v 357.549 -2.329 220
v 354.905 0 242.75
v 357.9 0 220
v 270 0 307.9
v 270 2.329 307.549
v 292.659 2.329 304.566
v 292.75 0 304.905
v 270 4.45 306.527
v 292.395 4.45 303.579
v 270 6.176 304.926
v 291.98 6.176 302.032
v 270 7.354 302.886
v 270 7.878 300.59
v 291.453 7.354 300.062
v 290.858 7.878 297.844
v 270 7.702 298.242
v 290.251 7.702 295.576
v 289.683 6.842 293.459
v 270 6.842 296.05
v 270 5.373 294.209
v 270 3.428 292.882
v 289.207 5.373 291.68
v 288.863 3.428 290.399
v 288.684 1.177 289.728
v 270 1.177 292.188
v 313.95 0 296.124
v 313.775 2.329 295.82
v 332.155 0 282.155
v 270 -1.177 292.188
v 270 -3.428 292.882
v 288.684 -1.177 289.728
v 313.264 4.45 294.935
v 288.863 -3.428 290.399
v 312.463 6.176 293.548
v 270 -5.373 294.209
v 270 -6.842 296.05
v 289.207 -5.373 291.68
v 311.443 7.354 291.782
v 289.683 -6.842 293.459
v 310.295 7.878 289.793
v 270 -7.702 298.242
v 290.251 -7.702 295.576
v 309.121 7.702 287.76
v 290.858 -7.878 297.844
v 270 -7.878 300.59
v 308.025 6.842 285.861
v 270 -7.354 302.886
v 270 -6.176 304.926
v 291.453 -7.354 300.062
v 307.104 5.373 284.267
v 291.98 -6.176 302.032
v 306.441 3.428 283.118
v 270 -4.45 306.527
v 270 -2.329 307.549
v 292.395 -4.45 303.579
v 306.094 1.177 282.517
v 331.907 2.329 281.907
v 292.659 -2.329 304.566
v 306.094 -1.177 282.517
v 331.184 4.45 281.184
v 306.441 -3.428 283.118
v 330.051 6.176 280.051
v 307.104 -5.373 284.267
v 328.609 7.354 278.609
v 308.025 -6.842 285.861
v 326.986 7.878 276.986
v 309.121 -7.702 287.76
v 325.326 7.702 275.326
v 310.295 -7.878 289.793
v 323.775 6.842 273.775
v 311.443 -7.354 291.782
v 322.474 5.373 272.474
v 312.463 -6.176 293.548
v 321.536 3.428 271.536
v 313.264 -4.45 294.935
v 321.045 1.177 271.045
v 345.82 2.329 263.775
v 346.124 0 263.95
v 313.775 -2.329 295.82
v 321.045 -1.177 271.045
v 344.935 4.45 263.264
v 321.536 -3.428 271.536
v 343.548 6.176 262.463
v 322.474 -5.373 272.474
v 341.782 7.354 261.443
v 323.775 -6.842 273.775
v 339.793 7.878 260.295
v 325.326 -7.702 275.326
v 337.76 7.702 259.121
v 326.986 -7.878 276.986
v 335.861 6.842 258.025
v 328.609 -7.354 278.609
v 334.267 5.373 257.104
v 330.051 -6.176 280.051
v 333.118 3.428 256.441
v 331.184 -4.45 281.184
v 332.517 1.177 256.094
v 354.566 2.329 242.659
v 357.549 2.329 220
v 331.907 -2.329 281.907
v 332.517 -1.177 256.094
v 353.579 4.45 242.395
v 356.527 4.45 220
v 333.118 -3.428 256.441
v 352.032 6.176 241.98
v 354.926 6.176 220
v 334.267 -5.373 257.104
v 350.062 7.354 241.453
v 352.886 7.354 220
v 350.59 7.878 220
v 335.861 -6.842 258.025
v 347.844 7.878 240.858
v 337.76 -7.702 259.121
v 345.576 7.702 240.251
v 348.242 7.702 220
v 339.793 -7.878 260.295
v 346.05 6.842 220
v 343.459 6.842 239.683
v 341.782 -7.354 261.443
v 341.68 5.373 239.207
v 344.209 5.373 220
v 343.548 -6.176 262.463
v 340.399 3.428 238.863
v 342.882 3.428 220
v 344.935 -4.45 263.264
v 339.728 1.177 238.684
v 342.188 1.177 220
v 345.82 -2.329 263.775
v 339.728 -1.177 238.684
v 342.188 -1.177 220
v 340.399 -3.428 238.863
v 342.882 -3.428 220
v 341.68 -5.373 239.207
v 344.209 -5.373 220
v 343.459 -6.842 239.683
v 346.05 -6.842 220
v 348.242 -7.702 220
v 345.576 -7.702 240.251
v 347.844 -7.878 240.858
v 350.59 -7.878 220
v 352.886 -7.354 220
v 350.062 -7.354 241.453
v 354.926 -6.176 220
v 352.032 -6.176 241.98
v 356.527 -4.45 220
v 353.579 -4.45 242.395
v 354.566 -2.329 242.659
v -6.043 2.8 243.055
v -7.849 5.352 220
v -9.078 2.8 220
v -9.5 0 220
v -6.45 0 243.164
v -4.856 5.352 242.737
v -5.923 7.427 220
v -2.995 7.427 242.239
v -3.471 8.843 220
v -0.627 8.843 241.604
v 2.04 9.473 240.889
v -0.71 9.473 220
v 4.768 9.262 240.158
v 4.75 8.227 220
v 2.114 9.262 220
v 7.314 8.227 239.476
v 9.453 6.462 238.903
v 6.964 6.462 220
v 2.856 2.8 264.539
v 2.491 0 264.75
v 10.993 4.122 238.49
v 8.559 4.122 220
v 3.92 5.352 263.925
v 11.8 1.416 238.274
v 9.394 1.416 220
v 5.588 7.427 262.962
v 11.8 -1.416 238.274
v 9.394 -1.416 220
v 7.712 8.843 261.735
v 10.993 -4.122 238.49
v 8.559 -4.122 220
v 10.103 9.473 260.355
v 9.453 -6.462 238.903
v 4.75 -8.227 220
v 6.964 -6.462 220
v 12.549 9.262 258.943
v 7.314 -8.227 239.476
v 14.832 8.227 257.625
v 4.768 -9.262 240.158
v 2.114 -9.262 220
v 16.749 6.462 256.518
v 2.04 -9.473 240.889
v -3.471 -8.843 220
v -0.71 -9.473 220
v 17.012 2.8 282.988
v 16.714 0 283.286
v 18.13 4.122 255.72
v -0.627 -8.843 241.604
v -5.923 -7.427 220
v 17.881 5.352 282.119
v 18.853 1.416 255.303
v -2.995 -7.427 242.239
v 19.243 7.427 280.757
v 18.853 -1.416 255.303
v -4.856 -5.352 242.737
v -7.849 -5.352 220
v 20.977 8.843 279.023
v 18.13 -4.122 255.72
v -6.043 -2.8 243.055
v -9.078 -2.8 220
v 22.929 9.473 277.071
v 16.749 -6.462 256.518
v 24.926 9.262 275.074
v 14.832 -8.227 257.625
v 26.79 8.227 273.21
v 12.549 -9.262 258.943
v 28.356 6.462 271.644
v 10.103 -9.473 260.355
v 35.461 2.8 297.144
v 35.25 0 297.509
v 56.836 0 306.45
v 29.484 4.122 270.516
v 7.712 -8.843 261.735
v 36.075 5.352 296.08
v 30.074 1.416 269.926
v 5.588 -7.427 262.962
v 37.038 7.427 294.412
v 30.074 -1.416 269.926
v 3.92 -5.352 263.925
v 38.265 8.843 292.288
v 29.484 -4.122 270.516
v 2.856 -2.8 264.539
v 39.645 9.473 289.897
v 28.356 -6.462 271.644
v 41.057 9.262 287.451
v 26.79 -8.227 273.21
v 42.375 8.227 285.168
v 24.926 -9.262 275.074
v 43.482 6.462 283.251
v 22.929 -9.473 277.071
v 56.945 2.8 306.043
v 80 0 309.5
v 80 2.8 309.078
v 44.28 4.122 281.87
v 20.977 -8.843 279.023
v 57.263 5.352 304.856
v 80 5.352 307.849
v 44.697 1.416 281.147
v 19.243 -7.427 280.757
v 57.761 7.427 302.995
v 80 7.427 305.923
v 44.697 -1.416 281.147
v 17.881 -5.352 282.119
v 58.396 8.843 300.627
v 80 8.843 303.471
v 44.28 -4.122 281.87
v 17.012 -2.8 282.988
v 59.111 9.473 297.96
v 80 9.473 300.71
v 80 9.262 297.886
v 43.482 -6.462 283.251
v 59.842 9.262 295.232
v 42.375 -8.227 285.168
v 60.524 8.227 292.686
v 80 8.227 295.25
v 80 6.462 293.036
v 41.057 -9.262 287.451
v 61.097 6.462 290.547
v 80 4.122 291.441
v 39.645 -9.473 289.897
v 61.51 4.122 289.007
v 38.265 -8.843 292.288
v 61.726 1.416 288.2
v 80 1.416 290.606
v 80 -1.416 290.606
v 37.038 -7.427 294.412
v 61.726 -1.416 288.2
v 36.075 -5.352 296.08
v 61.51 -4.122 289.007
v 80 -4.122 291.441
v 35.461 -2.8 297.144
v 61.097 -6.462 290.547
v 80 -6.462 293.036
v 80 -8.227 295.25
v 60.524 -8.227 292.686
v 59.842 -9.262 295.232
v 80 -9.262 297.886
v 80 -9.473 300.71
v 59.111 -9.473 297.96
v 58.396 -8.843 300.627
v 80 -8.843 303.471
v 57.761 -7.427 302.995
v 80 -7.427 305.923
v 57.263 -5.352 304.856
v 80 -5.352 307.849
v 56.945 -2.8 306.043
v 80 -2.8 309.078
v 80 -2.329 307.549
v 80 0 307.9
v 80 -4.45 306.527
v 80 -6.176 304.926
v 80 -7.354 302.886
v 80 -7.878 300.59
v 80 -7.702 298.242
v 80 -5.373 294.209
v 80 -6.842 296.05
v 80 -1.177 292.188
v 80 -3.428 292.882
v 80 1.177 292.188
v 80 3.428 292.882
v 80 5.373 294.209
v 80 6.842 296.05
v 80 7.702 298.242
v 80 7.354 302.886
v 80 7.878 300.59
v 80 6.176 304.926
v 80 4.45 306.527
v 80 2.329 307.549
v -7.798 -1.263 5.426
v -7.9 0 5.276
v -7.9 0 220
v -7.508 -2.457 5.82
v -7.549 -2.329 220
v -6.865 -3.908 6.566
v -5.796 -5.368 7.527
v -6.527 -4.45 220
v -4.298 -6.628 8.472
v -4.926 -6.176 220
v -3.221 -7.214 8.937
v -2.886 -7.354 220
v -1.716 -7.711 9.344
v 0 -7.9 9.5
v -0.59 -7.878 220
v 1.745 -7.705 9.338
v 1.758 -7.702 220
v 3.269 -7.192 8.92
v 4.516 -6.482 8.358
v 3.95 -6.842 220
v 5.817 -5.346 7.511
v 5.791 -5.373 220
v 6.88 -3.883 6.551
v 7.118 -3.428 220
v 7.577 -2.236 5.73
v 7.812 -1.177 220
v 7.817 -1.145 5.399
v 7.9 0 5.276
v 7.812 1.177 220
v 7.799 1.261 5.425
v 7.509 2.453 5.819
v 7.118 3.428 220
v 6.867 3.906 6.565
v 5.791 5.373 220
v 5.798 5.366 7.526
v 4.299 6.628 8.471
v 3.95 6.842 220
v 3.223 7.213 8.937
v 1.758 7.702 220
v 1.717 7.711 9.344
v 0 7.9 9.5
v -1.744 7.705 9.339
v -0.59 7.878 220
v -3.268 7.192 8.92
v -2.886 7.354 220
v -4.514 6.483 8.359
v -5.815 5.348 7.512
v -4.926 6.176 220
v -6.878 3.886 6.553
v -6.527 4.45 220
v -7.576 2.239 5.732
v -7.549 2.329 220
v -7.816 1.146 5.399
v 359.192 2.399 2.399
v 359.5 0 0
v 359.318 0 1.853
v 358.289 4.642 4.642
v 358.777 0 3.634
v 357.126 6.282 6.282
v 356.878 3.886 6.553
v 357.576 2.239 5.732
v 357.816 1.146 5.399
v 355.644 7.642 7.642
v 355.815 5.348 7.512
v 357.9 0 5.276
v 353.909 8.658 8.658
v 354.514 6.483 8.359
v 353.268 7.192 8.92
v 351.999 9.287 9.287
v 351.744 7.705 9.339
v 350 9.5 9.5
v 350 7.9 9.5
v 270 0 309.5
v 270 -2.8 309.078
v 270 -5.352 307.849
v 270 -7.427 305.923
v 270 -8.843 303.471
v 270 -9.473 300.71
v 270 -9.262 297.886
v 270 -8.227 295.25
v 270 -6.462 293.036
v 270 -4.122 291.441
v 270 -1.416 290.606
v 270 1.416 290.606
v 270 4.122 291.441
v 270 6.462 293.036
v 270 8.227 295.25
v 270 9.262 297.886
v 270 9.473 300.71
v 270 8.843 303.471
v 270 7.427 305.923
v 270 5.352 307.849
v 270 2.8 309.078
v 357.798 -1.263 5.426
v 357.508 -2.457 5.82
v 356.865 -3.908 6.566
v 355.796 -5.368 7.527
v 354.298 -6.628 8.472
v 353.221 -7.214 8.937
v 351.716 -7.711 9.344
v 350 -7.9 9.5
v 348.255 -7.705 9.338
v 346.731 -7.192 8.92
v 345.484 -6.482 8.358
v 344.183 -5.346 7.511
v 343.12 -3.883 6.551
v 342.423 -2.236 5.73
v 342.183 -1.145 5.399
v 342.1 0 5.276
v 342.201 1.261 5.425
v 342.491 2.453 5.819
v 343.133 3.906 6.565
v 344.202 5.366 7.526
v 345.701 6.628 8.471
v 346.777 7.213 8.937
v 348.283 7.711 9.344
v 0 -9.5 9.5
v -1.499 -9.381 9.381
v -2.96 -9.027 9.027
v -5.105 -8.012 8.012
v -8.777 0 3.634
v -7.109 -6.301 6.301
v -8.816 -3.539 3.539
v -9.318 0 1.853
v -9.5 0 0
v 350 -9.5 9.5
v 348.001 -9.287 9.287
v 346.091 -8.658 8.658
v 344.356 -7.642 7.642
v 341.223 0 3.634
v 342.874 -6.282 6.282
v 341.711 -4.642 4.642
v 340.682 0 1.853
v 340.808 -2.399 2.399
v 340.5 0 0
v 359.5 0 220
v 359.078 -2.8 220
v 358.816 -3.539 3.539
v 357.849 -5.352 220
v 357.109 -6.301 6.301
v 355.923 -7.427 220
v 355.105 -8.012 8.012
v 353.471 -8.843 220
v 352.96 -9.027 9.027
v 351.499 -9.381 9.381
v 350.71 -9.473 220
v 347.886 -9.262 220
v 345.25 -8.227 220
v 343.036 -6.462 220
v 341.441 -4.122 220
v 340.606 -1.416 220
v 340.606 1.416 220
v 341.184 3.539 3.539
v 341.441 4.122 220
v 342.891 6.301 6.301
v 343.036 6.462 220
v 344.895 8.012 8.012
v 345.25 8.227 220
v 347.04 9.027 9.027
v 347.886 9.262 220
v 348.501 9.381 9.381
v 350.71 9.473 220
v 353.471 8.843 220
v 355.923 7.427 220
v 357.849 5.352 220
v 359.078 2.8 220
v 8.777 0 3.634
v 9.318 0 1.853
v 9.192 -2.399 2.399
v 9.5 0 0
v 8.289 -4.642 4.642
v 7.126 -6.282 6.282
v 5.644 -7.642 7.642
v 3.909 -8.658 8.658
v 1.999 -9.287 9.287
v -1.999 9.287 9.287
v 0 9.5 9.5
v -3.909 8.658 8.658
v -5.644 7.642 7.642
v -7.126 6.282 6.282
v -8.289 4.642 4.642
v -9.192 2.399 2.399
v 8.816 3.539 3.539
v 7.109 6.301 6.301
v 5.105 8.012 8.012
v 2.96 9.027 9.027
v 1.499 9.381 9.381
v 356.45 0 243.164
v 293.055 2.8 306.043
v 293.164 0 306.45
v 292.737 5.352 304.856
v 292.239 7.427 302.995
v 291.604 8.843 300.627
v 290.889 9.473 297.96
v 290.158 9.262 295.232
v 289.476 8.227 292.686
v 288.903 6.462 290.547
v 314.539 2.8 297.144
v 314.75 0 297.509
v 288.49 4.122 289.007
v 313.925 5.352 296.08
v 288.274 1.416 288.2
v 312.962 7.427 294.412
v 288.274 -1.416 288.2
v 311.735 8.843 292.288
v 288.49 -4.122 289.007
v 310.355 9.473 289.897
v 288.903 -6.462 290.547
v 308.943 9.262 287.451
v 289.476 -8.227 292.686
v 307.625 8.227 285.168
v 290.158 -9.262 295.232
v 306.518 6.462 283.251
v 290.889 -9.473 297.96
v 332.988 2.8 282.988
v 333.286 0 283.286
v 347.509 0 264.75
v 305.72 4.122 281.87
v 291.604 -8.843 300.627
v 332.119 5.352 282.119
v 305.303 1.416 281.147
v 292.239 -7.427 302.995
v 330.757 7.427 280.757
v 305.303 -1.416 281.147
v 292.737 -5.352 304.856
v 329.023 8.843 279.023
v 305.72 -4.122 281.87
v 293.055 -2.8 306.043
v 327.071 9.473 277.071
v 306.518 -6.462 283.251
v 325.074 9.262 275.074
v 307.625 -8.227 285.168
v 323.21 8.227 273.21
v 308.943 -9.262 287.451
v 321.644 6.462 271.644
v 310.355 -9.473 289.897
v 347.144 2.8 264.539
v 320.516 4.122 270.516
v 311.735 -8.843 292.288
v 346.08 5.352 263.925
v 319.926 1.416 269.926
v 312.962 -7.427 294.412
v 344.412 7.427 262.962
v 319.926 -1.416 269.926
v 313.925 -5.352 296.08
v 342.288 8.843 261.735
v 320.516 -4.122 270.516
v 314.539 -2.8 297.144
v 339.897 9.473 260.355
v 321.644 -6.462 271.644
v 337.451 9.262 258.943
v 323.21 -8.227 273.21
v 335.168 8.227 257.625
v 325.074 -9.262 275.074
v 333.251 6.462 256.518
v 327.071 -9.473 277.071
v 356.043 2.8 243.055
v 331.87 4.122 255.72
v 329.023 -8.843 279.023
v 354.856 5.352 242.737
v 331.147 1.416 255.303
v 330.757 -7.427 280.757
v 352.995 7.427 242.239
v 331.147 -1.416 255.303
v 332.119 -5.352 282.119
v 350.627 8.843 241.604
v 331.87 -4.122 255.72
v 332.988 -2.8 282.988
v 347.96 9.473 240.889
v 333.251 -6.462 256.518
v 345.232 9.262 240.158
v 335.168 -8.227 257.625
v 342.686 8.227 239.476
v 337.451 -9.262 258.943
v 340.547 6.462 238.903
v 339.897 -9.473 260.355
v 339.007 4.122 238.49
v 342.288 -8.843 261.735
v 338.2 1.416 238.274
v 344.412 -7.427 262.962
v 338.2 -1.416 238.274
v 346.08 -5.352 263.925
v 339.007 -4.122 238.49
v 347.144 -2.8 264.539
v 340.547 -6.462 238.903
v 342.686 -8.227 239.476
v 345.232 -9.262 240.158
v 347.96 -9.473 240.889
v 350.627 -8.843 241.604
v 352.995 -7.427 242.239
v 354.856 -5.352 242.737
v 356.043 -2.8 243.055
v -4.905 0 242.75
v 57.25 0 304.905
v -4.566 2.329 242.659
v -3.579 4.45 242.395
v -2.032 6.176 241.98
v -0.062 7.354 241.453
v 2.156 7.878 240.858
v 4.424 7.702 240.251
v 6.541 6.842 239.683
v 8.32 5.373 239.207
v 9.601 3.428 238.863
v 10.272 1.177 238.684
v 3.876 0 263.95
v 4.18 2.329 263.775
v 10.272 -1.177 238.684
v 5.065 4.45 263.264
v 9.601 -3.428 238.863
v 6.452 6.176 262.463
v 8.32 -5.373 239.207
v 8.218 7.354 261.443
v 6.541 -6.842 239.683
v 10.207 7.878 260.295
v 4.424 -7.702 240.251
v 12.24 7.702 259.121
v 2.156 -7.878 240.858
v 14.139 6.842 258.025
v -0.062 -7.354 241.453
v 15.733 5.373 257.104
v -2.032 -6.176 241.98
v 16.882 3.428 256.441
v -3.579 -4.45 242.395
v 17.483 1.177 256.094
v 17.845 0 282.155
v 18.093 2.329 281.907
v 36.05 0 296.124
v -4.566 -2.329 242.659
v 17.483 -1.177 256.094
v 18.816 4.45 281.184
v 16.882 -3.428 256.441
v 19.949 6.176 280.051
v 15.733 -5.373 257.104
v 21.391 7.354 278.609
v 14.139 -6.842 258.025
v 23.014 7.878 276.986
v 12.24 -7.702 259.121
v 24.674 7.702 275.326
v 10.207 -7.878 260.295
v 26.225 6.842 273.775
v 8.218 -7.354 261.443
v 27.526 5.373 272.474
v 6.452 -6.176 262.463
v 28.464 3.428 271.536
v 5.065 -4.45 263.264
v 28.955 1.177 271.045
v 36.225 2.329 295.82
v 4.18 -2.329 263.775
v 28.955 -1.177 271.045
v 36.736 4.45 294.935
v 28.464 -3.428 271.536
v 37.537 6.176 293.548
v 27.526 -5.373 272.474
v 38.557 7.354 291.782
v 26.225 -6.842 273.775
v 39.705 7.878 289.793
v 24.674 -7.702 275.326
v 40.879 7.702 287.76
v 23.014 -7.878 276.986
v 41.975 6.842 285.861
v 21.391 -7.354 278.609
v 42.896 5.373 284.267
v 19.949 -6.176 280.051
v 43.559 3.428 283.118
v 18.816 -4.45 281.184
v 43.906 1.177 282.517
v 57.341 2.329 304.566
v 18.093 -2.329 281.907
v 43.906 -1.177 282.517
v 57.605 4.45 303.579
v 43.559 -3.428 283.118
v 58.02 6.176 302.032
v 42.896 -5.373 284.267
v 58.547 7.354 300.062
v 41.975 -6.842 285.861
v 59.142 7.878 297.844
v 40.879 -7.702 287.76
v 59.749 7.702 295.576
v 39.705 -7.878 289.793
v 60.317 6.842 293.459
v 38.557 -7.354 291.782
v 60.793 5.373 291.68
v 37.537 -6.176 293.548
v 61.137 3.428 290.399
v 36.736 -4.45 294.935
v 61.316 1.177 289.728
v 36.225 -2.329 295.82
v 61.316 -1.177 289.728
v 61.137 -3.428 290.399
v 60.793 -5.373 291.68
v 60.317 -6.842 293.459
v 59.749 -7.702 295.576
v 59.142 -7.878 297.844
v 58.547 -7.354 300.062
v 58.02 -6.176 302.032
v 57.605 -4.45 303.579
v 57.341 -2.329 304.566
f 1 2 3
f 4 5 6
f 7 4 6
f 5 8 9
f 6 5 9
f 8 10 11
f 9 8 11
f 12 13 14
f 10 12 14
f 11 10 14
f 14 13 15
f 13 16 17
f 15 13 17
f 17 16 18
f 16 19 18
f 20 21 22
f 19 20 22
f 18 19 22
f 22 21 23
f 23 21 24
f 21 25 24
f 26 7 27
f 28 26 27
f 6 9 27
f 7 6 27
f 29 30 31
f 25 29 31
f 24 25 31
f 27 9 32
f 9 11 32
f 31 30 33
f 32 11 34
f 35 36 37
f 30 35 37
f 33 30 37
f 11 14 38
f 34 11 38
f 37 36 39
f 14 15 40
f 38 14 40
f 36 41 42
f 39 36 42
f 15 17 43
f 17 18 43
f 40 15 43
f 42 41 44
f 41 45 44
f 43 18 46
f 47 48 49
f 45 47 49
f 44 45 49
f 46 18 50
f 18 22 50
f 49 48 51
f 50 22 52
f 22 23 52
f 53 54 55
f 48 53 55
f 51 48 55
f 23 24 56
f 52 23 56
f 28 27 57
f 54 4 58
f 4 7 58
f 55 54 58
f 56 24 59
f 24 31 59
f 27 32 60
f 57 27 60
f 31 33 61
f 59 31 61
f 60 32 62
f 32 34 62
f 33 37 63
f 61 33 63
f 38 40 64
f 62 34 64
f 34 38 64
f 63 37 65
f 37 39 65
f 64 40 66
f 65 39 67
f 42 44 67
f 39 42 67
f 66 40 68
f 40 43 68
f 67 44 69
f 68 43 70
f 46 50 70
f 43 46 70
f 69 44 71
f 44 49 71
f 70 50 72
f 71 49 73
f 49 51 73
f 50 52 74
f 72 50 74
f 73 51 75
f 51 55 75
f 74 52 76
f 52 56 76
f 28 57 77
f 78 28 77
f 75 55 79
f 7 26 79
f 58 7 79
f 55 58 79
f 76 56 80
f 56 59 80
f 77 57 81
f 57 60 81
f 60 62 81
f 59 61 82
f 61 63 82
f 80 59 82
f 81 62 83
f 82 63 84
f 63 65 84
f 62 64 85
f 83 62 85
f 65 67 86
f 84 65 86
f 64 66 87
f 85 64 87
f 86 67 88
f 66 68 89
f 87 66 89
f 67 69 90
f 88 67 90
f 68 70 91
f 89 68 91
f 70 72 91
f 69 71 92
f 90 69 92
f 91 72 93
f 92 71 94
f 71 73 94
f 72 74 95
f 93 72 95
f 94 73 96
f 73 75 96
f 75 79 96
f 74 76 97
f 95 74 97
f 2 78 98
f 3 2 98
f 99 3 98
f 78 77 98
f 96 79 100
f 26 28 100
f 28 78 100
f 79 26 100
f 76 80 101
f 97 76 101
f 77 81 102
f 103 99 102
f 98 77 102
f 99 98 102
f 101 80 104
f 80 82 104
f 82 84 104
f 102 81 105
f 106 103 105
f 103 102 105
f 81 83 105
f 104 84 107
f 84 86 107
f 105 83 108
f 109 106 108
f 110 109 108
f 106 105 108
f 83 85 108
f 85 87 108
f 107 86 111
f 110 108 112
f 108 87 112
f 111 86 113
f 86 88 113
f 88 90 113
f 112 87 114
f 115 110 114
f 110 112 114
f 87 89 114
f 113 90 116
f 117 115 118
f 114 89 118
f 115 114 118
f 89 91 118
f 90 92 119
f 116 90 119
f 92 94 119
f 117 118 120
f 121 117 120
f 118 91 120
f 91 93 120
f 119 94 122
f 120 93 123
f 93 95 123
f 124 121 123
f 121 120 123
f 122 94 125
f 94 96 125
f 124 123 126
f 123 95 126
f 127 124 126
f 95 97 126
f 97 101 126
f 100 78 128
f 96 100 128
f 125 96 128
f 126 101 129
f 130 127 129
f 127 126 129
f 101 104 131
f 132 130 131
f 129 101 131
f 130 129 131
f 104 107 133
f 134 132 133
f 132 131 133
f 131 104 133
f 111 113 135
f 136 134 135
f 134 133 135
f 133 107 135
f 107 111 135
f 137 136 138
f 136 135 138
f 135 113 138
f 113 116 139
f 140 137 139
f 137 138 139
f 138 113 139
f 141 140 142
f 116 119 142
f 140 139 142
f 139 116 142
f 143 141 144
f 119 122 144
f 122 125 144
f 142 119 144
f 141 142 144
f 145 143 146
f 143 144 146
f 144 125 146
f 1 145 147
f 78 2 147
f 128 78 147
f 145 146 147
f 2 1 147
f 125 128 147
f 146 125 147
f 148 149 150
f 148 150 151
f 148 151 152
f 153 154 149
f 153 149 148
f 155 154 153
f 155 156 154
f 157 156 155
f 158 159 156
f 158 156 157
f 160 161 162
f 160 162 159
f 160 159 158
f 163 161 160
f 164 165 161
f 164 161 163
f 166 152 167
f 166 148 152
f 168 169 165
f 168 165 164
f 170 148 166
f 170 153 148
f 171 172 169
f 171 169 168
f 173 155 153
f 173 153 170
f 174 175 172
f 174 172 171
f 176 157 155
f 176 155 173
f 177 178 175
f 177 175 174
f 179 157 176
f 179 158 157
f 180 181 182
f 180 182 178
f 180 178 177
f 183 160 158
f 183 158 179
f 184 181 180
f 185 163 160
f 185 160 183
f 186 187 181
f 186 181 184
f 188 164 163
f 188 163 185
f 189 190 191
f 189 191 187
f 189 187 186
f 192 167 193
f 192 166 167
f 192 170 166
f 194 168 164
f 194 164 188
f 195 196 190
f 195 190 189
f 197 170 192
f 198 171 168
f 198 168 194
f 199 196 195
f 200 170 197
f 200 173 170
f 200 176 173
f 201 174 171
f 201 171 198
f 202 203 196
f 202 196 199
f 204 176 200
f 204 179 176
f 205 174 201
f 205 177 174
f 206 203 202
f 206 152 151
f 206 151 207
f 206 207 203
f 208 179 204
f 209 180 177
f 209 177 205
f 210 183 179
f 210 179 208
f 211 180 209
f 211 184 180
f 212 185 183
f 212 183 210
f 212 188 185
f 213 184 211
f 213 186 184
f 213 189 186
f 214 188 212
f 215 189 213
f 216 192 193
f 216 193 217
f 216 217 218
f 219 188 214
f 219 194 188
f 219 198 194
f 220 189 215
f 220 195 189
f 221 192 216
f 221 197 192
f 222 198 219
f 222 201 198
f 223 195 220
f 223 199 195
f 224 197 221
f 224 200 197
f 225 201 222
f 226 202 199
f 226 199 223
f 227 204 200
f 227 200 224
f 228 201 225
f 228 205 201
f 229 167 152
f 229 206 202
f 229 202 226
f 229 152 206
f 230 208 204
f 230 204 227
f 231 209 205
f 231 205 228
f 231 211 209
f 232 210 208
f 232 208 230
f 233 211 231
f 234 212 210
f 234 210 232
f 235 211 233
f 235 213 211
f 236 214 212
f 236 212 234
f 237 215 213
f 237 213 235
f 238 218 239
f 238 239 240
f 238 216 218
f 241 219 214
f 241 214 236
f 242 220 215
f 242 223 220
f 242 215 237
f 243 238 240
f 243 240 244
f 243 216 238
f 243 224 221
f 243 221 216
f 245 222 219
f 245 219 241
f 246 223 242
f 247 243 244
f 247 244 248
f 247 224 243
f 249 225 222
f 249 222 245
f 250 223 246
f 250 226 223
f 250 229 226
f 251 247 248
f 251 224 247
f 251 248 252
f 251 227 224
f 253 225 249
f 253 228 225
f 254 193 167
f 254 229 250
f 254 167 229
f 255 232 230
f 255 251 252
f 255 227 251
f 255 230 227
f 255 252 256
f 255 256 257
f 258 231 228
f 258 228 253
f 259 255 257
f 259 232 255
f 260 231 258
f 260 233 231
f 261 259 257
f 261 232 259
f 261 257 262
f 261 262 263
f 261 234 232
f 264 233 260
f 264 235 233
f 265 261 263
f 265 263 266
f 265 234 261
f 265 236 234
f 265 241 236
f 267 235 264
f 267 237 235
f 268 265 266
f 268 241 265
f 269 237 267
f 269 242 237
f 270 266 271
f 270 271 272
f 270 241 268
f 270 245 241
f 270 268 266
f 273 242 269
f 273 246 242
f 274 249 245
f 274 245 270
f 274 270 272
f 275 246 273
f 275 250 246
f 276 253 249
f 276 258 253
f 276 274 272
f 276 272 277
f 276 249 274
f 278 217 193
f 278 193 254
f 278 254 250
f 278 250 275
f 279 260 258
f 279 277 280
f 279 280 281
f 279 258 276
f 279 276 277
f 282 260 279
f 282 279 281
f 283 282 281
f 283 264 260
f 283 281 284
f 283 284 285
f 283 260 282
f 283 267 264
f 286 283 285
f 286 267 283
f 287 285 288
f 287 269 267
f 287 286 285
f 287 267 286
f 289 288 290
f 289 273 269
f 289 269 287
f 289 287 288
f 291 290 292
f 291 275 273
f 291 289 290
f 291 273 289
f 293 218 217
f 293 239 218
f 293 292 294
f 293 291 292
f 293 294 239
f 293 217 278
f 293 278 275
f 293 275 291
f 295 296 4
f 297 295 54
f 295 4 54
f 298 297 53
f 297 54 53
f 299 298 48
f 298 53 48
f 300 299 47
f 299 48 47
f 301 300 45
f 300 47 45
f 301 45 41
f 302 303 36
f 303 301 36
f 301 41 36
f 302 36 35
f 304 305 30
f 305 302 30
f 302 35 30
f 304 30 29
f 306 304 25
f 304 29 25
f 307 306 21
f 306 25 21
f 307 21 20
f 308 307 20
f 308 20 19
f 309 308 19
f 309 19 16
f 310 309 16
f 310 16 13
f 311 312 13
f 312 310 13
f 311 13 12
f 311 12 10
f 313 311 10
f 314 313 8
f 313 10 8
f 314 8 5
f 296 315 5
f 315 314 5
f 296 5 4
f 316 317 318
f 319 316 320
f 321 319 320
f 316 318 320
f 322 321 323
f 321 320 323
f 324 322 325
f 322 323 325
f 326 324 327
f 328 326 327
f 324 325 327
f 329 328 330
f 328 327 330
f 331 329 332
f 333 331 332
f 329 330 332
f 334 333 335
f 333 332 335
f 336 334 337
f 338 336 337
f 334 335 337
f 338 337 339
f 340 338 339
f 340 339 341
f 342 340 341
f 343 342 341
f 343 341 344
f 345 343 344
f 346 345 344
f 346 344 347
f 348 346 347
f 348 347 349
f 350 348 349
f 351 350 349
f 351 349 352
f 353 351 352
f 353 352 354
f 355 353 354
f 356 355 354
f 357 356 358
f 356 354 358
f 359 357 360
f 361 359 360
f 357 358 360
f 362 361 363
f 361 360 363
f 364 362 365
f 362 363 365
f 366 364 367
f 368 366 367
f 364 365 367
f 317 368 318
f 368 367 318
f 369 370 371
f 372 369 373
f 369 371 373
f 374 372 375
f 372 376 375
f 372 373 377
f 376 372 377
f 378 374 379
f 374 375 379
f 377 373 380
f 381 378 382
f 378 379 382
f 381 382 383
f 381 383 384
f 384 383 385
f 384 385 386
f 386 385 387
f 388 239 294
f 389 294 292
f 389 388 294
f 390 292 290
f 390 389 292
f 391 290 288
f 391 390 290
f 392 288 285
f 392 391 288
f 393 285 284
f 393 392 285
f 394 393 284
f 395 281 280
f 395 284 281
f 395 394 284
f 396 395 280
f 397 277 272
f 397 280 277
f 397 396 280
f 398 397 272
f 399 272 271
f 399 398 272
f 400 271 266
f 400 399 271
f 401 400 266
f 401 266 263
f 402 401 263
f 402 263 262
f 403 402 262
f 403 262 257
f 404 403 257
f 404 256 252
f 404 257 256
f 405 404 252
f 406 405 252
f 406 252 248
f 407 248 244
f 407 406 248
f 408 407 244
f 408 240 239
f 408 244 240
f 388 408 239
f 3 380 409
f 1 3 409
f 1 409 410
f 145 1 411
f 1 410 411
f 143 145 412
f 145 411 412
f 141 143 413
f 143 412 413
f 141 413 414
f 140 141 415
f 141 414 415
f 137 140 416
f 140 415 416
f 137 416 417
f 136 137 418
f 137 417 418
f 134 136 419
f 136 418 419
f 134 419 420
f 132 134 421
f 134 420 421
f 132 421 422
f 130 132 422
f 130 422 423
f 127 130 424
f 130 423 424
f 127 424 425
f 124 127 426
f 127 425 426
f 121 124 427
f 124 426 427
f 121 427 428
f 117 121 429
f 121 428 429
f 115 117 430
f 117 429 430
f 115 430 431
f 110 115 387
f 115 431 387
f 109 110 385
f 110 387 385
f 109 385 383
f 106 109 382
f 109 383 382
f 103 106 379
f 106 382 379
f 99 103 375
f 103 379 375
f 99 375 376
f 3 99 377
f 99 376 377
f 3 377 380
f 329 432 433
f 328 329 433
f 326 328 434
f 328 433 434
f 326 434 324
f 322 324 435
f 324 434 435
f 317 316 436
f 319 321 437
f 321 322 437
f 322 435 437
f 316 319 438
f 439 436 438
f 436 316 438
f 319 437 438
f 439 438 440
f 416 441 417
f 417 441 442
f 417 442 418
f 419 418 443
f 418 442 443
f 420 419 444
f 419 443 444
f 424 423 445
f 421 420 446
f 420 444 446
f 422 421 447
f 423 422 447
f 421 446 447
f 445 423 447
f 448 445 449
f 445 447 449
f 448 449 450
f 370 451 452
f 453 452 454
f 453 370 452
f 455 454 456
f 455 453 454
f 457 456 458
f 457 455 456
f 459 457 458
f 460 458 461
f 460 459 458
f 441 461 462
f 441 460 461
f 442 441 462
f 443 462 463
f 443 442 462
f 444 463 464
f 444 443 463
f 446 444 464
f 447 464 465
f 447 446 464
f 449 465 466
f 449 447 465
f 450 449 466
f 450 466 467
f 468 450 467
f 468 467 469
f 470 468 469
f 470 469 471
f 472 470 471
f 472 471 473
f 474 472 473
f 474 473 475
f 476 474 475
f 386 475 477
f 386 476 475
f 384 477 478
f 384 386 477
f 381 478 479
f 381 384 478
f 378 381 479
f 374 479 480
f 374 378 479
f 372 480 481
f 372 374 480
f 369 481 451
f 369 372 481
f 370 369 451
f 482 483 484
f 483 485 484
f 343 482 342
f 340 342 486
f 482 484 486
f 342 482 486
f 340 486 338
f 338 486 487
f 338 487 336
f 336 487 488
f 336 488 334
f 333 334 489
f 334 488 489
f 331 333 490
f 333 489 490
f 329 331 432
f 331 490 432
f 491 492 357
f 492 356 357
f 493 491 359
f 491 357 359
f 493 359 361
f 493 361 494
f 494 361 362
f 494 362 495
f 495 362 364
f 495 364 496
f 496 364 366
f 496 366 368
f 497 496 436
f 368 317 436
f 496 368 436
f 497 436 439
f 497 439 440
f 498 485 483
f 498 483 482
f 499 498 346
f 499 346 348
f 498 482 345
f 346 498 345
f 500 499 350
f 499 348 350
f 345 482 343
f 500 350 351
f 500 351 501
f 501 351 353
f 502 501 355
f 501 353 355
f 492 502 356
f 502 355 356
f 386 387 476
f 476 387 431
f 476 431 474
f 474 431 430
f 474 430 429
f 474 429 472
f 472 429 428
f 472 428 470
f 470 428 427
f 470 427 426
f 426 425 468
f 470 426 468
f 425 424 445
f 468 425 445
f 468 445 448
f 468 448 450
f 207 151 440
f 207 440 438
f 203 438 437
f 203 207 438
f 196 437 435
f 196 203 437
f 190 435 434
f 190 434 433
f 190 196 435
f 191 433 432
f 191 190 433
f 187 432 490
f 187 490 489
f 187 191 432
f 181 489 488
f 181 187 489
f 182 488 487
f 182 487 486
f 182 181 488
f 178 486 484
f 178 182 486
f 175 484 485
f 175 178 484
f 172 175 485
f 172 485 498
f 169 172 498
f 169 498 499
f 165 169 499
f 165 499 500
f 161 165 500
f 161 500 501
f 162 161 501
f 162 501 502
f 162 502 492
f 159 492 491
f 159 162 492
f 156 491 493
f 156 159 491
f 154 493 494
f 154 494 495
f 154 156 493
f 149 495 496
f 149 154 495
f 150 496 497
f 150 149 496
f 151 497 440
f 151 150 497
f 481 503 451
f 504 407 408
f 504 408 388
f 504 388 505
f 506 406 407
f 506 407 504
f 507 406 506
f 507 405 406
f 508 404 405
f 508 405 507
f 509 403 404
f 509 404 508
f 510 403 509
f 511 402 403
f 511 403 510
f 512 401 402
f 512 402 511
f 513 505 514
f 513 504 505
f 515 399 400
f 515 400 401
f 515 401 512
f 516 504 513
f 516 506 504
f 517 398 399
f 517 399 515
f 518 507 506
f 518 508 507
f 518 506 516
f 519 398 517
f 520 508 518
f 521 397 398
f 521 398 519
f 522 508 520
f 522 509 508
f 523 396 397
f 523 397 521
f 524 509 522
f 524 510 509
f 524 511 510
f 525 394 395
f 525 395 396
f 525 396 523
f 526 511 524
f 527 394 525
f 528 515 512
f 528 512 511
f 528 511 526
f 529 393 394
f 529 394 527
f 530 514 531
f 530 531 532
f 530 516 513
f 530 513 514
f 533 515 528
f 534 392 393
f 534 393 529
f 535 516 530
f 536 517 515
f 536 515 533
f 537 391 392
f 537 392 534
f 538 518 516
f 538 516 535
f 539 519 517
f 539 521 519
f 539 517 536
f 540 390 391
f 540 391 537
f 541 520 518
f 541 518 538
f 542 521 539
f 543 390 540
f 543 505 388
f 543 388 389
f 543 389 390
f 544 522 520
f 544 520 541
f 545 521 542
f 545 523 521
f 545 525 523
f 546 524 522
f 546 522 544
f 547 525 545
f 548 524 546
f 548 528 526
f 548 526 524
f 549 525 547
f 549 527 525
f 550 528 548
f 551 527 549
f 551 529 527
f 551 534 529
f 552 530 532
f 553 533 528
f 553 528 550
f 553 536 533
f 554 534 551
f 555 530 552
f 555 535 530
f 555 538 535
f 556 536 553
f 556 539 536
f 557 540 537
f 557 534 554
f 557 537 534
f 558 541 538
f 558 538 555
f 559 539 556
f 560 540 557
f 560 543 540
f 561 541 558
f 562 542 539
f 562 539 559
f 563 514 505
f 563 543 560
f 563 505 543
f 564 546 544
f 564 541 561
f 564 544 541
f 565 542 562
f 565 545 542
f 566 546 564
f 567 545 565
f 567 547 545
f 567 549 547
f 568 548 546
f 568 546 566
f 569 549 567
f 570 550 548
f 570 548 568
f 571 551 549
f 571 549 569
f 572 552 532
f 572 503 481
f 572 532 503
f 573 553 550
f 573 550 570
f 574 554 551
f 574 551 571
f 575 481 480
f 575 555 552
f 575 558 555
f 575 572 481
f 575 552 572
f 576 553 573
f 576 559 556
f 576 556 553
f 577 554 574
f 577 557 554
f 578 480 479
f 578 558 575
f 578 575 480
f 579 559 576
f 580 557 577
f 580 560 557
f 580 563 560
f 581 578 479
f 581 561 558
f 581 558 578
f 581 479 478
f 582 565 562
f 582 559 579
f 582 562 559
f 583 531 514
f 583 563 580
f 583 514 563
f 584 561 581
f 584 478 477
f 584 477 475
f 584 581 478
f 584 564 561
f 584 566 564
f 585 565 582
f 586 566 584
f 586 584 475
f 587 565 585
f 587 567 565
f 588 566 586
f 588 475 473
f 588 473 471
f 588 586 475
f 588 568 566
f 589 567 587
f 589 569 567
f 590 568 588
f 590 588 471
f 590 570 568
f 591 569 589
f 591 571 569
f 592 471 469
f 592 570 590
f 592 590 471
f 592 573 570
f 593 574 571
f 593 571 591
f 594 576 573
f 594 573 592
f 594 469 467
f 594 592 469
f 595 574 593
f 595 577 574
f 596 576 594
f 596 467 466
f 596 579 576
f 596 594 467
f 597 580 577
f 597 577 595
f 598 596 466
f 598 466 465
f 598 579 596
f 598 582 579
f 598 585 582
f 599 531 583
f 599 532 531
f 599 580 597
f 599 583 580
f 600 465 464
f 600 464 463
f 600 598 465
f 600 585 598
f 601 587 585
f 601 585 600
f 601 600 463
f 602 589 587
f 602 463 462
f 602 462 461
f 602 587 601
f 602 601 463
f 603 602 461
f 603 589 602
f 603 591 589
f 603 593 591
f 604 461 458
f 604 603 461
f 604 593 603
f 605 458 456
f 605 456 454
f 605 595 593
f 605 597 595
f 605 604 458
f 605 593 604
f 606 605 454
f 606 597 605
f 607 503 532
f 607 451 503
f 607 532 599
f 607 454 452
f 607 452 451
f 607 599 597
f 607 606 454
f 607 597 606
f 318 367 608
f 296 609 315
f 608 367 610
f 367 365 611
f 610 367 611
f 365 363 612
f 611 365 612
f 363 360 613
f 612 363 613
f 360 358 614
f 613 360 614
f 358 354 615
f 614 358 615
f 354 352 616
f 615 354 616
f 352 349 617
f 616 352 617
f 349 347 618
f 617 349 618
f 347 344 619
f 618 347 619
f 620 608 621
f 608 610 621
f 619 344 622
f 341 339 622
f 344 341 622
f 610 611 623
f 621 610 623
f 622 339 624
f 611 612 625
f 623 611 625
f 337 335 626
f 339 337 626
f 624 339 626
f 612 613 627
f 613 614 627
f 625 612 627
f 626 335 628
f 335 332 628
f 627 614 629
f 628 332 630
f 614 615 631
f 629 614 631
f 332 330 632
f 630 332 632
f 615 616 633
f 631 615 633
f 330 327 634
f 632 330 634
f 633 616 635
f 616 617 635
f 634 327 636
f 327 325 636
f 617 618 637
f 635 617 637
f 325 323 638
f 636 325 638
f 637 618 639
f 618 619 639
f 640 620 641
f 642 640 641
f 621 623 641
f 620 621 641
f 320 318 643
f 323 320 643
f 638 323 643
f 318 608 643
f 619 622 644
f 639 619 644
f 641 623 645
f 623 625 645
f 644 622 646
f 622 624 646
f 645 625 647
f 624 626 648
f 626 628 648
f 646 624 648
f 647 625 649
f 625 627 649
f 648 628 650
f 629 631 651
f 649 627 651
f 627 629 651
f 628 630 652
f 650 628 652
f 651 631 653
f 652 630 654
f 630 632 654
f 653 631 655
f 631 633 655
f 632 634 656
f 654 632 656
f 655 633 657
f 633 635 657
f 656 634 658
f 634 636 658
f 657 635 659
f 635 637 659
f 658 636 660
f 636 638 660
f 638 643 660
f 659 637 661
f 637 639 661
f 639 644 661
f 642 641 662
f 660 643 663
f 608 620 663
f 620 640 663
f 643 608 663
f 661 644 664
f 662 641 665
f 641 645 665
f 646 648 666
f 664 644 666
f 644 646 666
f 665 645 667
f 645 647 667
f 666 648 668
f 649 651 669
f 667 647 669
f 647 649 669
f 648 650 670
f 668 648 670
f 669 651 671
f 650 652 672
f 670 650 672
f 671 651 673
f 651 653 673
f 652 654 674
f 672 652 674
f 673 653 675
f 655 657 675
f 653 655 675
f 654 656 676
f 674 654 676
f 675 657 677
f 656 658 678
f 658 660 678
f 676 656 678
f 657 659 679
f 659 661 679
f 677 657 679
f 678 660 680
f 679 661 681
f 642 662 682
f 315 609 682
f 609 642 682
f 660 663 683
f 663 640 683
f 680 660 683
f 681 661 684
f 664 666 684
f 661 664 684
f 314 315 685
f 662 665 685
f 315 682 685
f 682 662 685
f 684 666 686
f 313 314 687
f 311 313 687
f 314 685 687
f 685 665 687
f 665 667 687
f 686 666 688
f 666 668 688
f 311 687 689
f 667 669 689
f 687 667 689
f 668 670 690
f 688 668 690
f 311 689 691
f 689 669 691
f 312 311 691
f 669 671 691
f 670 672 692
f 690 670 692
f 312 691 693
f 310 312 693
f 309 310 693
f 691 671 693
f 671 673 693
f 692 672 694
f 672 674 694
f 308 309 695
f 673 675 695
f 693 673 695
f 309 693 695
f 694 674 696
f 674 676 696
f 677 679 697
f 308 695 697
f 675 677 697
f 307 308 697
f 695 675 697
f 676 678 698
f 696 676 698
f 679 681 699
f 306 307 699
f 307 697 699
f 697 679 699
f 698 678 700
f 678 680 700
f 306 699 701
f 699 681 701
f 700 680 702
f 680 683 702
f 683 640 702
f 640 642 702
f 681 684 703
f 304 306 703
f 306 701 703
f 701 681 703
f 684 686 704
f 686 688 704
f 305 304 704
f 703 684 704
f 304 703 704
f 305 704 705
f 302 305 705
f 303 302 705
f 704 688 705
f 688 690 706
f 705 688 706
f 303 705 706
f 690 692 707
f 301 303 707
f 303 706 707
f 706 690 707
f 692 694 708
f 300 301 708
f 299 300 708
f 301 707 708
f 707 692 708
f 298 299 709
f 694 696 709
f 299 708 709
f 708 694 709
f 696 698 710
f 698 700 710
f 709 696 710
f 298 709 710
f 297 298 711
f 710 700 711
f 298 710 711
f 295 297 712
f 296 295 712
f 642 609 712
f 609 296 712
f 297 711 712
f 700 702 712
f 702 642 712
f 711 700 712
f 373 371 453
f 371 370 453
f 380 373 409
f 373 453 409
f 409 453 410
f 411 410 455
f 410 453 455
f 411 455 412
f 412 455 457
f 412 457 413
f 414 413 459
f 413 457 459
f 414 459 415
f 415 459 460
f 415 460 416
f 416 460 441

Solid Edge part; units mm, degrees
sketch "Sketch1" plane through (0, 0, 0) normal (0, -1, 0) x (1, 0, 0)
  line L0 (0, 0) -> (0, 220)
  arc A0 (0, 220) -> (80, 300) centre (80, 220) cw
  line L1 (80, 300) -> (270, 300)
  arc A1 (270, 300) -> (350, 220) centre (270, 220) cw
  line L2 (350, 220) -> (350, 0)
  dimension "D1" = 350
  dimension "D2" = 80
  dimension "D3" = 300
sketch "Sketch2" plane through (0, 0, 0) normal (0, 0, -1) x (-1, 0, 0)
  circle A0 centre (0, 0) radius 9.5
  dimension "D1" = 19
sweep "SweptProtrusion_1" add profiles "Sketch2" path "Sketch1"
shell "Thinwall_1" thickness 1.6 removed faces 4 at (6.5233, -6.1433, 0) at (343.4767, -6.1433, 0) at (6.5233, -6.1433, 0) at (343.4767, -6.1433, 0)
hole "Hole_1" at (0, 0, 0) direction (0, -1, 0) diameter 19 end through all both ways yes
hole "Hole1" at (350, 0, 0) direction (0, -1, 0) diameter 19 end through all both ways yes
properties material "Aluminum, 1060"
